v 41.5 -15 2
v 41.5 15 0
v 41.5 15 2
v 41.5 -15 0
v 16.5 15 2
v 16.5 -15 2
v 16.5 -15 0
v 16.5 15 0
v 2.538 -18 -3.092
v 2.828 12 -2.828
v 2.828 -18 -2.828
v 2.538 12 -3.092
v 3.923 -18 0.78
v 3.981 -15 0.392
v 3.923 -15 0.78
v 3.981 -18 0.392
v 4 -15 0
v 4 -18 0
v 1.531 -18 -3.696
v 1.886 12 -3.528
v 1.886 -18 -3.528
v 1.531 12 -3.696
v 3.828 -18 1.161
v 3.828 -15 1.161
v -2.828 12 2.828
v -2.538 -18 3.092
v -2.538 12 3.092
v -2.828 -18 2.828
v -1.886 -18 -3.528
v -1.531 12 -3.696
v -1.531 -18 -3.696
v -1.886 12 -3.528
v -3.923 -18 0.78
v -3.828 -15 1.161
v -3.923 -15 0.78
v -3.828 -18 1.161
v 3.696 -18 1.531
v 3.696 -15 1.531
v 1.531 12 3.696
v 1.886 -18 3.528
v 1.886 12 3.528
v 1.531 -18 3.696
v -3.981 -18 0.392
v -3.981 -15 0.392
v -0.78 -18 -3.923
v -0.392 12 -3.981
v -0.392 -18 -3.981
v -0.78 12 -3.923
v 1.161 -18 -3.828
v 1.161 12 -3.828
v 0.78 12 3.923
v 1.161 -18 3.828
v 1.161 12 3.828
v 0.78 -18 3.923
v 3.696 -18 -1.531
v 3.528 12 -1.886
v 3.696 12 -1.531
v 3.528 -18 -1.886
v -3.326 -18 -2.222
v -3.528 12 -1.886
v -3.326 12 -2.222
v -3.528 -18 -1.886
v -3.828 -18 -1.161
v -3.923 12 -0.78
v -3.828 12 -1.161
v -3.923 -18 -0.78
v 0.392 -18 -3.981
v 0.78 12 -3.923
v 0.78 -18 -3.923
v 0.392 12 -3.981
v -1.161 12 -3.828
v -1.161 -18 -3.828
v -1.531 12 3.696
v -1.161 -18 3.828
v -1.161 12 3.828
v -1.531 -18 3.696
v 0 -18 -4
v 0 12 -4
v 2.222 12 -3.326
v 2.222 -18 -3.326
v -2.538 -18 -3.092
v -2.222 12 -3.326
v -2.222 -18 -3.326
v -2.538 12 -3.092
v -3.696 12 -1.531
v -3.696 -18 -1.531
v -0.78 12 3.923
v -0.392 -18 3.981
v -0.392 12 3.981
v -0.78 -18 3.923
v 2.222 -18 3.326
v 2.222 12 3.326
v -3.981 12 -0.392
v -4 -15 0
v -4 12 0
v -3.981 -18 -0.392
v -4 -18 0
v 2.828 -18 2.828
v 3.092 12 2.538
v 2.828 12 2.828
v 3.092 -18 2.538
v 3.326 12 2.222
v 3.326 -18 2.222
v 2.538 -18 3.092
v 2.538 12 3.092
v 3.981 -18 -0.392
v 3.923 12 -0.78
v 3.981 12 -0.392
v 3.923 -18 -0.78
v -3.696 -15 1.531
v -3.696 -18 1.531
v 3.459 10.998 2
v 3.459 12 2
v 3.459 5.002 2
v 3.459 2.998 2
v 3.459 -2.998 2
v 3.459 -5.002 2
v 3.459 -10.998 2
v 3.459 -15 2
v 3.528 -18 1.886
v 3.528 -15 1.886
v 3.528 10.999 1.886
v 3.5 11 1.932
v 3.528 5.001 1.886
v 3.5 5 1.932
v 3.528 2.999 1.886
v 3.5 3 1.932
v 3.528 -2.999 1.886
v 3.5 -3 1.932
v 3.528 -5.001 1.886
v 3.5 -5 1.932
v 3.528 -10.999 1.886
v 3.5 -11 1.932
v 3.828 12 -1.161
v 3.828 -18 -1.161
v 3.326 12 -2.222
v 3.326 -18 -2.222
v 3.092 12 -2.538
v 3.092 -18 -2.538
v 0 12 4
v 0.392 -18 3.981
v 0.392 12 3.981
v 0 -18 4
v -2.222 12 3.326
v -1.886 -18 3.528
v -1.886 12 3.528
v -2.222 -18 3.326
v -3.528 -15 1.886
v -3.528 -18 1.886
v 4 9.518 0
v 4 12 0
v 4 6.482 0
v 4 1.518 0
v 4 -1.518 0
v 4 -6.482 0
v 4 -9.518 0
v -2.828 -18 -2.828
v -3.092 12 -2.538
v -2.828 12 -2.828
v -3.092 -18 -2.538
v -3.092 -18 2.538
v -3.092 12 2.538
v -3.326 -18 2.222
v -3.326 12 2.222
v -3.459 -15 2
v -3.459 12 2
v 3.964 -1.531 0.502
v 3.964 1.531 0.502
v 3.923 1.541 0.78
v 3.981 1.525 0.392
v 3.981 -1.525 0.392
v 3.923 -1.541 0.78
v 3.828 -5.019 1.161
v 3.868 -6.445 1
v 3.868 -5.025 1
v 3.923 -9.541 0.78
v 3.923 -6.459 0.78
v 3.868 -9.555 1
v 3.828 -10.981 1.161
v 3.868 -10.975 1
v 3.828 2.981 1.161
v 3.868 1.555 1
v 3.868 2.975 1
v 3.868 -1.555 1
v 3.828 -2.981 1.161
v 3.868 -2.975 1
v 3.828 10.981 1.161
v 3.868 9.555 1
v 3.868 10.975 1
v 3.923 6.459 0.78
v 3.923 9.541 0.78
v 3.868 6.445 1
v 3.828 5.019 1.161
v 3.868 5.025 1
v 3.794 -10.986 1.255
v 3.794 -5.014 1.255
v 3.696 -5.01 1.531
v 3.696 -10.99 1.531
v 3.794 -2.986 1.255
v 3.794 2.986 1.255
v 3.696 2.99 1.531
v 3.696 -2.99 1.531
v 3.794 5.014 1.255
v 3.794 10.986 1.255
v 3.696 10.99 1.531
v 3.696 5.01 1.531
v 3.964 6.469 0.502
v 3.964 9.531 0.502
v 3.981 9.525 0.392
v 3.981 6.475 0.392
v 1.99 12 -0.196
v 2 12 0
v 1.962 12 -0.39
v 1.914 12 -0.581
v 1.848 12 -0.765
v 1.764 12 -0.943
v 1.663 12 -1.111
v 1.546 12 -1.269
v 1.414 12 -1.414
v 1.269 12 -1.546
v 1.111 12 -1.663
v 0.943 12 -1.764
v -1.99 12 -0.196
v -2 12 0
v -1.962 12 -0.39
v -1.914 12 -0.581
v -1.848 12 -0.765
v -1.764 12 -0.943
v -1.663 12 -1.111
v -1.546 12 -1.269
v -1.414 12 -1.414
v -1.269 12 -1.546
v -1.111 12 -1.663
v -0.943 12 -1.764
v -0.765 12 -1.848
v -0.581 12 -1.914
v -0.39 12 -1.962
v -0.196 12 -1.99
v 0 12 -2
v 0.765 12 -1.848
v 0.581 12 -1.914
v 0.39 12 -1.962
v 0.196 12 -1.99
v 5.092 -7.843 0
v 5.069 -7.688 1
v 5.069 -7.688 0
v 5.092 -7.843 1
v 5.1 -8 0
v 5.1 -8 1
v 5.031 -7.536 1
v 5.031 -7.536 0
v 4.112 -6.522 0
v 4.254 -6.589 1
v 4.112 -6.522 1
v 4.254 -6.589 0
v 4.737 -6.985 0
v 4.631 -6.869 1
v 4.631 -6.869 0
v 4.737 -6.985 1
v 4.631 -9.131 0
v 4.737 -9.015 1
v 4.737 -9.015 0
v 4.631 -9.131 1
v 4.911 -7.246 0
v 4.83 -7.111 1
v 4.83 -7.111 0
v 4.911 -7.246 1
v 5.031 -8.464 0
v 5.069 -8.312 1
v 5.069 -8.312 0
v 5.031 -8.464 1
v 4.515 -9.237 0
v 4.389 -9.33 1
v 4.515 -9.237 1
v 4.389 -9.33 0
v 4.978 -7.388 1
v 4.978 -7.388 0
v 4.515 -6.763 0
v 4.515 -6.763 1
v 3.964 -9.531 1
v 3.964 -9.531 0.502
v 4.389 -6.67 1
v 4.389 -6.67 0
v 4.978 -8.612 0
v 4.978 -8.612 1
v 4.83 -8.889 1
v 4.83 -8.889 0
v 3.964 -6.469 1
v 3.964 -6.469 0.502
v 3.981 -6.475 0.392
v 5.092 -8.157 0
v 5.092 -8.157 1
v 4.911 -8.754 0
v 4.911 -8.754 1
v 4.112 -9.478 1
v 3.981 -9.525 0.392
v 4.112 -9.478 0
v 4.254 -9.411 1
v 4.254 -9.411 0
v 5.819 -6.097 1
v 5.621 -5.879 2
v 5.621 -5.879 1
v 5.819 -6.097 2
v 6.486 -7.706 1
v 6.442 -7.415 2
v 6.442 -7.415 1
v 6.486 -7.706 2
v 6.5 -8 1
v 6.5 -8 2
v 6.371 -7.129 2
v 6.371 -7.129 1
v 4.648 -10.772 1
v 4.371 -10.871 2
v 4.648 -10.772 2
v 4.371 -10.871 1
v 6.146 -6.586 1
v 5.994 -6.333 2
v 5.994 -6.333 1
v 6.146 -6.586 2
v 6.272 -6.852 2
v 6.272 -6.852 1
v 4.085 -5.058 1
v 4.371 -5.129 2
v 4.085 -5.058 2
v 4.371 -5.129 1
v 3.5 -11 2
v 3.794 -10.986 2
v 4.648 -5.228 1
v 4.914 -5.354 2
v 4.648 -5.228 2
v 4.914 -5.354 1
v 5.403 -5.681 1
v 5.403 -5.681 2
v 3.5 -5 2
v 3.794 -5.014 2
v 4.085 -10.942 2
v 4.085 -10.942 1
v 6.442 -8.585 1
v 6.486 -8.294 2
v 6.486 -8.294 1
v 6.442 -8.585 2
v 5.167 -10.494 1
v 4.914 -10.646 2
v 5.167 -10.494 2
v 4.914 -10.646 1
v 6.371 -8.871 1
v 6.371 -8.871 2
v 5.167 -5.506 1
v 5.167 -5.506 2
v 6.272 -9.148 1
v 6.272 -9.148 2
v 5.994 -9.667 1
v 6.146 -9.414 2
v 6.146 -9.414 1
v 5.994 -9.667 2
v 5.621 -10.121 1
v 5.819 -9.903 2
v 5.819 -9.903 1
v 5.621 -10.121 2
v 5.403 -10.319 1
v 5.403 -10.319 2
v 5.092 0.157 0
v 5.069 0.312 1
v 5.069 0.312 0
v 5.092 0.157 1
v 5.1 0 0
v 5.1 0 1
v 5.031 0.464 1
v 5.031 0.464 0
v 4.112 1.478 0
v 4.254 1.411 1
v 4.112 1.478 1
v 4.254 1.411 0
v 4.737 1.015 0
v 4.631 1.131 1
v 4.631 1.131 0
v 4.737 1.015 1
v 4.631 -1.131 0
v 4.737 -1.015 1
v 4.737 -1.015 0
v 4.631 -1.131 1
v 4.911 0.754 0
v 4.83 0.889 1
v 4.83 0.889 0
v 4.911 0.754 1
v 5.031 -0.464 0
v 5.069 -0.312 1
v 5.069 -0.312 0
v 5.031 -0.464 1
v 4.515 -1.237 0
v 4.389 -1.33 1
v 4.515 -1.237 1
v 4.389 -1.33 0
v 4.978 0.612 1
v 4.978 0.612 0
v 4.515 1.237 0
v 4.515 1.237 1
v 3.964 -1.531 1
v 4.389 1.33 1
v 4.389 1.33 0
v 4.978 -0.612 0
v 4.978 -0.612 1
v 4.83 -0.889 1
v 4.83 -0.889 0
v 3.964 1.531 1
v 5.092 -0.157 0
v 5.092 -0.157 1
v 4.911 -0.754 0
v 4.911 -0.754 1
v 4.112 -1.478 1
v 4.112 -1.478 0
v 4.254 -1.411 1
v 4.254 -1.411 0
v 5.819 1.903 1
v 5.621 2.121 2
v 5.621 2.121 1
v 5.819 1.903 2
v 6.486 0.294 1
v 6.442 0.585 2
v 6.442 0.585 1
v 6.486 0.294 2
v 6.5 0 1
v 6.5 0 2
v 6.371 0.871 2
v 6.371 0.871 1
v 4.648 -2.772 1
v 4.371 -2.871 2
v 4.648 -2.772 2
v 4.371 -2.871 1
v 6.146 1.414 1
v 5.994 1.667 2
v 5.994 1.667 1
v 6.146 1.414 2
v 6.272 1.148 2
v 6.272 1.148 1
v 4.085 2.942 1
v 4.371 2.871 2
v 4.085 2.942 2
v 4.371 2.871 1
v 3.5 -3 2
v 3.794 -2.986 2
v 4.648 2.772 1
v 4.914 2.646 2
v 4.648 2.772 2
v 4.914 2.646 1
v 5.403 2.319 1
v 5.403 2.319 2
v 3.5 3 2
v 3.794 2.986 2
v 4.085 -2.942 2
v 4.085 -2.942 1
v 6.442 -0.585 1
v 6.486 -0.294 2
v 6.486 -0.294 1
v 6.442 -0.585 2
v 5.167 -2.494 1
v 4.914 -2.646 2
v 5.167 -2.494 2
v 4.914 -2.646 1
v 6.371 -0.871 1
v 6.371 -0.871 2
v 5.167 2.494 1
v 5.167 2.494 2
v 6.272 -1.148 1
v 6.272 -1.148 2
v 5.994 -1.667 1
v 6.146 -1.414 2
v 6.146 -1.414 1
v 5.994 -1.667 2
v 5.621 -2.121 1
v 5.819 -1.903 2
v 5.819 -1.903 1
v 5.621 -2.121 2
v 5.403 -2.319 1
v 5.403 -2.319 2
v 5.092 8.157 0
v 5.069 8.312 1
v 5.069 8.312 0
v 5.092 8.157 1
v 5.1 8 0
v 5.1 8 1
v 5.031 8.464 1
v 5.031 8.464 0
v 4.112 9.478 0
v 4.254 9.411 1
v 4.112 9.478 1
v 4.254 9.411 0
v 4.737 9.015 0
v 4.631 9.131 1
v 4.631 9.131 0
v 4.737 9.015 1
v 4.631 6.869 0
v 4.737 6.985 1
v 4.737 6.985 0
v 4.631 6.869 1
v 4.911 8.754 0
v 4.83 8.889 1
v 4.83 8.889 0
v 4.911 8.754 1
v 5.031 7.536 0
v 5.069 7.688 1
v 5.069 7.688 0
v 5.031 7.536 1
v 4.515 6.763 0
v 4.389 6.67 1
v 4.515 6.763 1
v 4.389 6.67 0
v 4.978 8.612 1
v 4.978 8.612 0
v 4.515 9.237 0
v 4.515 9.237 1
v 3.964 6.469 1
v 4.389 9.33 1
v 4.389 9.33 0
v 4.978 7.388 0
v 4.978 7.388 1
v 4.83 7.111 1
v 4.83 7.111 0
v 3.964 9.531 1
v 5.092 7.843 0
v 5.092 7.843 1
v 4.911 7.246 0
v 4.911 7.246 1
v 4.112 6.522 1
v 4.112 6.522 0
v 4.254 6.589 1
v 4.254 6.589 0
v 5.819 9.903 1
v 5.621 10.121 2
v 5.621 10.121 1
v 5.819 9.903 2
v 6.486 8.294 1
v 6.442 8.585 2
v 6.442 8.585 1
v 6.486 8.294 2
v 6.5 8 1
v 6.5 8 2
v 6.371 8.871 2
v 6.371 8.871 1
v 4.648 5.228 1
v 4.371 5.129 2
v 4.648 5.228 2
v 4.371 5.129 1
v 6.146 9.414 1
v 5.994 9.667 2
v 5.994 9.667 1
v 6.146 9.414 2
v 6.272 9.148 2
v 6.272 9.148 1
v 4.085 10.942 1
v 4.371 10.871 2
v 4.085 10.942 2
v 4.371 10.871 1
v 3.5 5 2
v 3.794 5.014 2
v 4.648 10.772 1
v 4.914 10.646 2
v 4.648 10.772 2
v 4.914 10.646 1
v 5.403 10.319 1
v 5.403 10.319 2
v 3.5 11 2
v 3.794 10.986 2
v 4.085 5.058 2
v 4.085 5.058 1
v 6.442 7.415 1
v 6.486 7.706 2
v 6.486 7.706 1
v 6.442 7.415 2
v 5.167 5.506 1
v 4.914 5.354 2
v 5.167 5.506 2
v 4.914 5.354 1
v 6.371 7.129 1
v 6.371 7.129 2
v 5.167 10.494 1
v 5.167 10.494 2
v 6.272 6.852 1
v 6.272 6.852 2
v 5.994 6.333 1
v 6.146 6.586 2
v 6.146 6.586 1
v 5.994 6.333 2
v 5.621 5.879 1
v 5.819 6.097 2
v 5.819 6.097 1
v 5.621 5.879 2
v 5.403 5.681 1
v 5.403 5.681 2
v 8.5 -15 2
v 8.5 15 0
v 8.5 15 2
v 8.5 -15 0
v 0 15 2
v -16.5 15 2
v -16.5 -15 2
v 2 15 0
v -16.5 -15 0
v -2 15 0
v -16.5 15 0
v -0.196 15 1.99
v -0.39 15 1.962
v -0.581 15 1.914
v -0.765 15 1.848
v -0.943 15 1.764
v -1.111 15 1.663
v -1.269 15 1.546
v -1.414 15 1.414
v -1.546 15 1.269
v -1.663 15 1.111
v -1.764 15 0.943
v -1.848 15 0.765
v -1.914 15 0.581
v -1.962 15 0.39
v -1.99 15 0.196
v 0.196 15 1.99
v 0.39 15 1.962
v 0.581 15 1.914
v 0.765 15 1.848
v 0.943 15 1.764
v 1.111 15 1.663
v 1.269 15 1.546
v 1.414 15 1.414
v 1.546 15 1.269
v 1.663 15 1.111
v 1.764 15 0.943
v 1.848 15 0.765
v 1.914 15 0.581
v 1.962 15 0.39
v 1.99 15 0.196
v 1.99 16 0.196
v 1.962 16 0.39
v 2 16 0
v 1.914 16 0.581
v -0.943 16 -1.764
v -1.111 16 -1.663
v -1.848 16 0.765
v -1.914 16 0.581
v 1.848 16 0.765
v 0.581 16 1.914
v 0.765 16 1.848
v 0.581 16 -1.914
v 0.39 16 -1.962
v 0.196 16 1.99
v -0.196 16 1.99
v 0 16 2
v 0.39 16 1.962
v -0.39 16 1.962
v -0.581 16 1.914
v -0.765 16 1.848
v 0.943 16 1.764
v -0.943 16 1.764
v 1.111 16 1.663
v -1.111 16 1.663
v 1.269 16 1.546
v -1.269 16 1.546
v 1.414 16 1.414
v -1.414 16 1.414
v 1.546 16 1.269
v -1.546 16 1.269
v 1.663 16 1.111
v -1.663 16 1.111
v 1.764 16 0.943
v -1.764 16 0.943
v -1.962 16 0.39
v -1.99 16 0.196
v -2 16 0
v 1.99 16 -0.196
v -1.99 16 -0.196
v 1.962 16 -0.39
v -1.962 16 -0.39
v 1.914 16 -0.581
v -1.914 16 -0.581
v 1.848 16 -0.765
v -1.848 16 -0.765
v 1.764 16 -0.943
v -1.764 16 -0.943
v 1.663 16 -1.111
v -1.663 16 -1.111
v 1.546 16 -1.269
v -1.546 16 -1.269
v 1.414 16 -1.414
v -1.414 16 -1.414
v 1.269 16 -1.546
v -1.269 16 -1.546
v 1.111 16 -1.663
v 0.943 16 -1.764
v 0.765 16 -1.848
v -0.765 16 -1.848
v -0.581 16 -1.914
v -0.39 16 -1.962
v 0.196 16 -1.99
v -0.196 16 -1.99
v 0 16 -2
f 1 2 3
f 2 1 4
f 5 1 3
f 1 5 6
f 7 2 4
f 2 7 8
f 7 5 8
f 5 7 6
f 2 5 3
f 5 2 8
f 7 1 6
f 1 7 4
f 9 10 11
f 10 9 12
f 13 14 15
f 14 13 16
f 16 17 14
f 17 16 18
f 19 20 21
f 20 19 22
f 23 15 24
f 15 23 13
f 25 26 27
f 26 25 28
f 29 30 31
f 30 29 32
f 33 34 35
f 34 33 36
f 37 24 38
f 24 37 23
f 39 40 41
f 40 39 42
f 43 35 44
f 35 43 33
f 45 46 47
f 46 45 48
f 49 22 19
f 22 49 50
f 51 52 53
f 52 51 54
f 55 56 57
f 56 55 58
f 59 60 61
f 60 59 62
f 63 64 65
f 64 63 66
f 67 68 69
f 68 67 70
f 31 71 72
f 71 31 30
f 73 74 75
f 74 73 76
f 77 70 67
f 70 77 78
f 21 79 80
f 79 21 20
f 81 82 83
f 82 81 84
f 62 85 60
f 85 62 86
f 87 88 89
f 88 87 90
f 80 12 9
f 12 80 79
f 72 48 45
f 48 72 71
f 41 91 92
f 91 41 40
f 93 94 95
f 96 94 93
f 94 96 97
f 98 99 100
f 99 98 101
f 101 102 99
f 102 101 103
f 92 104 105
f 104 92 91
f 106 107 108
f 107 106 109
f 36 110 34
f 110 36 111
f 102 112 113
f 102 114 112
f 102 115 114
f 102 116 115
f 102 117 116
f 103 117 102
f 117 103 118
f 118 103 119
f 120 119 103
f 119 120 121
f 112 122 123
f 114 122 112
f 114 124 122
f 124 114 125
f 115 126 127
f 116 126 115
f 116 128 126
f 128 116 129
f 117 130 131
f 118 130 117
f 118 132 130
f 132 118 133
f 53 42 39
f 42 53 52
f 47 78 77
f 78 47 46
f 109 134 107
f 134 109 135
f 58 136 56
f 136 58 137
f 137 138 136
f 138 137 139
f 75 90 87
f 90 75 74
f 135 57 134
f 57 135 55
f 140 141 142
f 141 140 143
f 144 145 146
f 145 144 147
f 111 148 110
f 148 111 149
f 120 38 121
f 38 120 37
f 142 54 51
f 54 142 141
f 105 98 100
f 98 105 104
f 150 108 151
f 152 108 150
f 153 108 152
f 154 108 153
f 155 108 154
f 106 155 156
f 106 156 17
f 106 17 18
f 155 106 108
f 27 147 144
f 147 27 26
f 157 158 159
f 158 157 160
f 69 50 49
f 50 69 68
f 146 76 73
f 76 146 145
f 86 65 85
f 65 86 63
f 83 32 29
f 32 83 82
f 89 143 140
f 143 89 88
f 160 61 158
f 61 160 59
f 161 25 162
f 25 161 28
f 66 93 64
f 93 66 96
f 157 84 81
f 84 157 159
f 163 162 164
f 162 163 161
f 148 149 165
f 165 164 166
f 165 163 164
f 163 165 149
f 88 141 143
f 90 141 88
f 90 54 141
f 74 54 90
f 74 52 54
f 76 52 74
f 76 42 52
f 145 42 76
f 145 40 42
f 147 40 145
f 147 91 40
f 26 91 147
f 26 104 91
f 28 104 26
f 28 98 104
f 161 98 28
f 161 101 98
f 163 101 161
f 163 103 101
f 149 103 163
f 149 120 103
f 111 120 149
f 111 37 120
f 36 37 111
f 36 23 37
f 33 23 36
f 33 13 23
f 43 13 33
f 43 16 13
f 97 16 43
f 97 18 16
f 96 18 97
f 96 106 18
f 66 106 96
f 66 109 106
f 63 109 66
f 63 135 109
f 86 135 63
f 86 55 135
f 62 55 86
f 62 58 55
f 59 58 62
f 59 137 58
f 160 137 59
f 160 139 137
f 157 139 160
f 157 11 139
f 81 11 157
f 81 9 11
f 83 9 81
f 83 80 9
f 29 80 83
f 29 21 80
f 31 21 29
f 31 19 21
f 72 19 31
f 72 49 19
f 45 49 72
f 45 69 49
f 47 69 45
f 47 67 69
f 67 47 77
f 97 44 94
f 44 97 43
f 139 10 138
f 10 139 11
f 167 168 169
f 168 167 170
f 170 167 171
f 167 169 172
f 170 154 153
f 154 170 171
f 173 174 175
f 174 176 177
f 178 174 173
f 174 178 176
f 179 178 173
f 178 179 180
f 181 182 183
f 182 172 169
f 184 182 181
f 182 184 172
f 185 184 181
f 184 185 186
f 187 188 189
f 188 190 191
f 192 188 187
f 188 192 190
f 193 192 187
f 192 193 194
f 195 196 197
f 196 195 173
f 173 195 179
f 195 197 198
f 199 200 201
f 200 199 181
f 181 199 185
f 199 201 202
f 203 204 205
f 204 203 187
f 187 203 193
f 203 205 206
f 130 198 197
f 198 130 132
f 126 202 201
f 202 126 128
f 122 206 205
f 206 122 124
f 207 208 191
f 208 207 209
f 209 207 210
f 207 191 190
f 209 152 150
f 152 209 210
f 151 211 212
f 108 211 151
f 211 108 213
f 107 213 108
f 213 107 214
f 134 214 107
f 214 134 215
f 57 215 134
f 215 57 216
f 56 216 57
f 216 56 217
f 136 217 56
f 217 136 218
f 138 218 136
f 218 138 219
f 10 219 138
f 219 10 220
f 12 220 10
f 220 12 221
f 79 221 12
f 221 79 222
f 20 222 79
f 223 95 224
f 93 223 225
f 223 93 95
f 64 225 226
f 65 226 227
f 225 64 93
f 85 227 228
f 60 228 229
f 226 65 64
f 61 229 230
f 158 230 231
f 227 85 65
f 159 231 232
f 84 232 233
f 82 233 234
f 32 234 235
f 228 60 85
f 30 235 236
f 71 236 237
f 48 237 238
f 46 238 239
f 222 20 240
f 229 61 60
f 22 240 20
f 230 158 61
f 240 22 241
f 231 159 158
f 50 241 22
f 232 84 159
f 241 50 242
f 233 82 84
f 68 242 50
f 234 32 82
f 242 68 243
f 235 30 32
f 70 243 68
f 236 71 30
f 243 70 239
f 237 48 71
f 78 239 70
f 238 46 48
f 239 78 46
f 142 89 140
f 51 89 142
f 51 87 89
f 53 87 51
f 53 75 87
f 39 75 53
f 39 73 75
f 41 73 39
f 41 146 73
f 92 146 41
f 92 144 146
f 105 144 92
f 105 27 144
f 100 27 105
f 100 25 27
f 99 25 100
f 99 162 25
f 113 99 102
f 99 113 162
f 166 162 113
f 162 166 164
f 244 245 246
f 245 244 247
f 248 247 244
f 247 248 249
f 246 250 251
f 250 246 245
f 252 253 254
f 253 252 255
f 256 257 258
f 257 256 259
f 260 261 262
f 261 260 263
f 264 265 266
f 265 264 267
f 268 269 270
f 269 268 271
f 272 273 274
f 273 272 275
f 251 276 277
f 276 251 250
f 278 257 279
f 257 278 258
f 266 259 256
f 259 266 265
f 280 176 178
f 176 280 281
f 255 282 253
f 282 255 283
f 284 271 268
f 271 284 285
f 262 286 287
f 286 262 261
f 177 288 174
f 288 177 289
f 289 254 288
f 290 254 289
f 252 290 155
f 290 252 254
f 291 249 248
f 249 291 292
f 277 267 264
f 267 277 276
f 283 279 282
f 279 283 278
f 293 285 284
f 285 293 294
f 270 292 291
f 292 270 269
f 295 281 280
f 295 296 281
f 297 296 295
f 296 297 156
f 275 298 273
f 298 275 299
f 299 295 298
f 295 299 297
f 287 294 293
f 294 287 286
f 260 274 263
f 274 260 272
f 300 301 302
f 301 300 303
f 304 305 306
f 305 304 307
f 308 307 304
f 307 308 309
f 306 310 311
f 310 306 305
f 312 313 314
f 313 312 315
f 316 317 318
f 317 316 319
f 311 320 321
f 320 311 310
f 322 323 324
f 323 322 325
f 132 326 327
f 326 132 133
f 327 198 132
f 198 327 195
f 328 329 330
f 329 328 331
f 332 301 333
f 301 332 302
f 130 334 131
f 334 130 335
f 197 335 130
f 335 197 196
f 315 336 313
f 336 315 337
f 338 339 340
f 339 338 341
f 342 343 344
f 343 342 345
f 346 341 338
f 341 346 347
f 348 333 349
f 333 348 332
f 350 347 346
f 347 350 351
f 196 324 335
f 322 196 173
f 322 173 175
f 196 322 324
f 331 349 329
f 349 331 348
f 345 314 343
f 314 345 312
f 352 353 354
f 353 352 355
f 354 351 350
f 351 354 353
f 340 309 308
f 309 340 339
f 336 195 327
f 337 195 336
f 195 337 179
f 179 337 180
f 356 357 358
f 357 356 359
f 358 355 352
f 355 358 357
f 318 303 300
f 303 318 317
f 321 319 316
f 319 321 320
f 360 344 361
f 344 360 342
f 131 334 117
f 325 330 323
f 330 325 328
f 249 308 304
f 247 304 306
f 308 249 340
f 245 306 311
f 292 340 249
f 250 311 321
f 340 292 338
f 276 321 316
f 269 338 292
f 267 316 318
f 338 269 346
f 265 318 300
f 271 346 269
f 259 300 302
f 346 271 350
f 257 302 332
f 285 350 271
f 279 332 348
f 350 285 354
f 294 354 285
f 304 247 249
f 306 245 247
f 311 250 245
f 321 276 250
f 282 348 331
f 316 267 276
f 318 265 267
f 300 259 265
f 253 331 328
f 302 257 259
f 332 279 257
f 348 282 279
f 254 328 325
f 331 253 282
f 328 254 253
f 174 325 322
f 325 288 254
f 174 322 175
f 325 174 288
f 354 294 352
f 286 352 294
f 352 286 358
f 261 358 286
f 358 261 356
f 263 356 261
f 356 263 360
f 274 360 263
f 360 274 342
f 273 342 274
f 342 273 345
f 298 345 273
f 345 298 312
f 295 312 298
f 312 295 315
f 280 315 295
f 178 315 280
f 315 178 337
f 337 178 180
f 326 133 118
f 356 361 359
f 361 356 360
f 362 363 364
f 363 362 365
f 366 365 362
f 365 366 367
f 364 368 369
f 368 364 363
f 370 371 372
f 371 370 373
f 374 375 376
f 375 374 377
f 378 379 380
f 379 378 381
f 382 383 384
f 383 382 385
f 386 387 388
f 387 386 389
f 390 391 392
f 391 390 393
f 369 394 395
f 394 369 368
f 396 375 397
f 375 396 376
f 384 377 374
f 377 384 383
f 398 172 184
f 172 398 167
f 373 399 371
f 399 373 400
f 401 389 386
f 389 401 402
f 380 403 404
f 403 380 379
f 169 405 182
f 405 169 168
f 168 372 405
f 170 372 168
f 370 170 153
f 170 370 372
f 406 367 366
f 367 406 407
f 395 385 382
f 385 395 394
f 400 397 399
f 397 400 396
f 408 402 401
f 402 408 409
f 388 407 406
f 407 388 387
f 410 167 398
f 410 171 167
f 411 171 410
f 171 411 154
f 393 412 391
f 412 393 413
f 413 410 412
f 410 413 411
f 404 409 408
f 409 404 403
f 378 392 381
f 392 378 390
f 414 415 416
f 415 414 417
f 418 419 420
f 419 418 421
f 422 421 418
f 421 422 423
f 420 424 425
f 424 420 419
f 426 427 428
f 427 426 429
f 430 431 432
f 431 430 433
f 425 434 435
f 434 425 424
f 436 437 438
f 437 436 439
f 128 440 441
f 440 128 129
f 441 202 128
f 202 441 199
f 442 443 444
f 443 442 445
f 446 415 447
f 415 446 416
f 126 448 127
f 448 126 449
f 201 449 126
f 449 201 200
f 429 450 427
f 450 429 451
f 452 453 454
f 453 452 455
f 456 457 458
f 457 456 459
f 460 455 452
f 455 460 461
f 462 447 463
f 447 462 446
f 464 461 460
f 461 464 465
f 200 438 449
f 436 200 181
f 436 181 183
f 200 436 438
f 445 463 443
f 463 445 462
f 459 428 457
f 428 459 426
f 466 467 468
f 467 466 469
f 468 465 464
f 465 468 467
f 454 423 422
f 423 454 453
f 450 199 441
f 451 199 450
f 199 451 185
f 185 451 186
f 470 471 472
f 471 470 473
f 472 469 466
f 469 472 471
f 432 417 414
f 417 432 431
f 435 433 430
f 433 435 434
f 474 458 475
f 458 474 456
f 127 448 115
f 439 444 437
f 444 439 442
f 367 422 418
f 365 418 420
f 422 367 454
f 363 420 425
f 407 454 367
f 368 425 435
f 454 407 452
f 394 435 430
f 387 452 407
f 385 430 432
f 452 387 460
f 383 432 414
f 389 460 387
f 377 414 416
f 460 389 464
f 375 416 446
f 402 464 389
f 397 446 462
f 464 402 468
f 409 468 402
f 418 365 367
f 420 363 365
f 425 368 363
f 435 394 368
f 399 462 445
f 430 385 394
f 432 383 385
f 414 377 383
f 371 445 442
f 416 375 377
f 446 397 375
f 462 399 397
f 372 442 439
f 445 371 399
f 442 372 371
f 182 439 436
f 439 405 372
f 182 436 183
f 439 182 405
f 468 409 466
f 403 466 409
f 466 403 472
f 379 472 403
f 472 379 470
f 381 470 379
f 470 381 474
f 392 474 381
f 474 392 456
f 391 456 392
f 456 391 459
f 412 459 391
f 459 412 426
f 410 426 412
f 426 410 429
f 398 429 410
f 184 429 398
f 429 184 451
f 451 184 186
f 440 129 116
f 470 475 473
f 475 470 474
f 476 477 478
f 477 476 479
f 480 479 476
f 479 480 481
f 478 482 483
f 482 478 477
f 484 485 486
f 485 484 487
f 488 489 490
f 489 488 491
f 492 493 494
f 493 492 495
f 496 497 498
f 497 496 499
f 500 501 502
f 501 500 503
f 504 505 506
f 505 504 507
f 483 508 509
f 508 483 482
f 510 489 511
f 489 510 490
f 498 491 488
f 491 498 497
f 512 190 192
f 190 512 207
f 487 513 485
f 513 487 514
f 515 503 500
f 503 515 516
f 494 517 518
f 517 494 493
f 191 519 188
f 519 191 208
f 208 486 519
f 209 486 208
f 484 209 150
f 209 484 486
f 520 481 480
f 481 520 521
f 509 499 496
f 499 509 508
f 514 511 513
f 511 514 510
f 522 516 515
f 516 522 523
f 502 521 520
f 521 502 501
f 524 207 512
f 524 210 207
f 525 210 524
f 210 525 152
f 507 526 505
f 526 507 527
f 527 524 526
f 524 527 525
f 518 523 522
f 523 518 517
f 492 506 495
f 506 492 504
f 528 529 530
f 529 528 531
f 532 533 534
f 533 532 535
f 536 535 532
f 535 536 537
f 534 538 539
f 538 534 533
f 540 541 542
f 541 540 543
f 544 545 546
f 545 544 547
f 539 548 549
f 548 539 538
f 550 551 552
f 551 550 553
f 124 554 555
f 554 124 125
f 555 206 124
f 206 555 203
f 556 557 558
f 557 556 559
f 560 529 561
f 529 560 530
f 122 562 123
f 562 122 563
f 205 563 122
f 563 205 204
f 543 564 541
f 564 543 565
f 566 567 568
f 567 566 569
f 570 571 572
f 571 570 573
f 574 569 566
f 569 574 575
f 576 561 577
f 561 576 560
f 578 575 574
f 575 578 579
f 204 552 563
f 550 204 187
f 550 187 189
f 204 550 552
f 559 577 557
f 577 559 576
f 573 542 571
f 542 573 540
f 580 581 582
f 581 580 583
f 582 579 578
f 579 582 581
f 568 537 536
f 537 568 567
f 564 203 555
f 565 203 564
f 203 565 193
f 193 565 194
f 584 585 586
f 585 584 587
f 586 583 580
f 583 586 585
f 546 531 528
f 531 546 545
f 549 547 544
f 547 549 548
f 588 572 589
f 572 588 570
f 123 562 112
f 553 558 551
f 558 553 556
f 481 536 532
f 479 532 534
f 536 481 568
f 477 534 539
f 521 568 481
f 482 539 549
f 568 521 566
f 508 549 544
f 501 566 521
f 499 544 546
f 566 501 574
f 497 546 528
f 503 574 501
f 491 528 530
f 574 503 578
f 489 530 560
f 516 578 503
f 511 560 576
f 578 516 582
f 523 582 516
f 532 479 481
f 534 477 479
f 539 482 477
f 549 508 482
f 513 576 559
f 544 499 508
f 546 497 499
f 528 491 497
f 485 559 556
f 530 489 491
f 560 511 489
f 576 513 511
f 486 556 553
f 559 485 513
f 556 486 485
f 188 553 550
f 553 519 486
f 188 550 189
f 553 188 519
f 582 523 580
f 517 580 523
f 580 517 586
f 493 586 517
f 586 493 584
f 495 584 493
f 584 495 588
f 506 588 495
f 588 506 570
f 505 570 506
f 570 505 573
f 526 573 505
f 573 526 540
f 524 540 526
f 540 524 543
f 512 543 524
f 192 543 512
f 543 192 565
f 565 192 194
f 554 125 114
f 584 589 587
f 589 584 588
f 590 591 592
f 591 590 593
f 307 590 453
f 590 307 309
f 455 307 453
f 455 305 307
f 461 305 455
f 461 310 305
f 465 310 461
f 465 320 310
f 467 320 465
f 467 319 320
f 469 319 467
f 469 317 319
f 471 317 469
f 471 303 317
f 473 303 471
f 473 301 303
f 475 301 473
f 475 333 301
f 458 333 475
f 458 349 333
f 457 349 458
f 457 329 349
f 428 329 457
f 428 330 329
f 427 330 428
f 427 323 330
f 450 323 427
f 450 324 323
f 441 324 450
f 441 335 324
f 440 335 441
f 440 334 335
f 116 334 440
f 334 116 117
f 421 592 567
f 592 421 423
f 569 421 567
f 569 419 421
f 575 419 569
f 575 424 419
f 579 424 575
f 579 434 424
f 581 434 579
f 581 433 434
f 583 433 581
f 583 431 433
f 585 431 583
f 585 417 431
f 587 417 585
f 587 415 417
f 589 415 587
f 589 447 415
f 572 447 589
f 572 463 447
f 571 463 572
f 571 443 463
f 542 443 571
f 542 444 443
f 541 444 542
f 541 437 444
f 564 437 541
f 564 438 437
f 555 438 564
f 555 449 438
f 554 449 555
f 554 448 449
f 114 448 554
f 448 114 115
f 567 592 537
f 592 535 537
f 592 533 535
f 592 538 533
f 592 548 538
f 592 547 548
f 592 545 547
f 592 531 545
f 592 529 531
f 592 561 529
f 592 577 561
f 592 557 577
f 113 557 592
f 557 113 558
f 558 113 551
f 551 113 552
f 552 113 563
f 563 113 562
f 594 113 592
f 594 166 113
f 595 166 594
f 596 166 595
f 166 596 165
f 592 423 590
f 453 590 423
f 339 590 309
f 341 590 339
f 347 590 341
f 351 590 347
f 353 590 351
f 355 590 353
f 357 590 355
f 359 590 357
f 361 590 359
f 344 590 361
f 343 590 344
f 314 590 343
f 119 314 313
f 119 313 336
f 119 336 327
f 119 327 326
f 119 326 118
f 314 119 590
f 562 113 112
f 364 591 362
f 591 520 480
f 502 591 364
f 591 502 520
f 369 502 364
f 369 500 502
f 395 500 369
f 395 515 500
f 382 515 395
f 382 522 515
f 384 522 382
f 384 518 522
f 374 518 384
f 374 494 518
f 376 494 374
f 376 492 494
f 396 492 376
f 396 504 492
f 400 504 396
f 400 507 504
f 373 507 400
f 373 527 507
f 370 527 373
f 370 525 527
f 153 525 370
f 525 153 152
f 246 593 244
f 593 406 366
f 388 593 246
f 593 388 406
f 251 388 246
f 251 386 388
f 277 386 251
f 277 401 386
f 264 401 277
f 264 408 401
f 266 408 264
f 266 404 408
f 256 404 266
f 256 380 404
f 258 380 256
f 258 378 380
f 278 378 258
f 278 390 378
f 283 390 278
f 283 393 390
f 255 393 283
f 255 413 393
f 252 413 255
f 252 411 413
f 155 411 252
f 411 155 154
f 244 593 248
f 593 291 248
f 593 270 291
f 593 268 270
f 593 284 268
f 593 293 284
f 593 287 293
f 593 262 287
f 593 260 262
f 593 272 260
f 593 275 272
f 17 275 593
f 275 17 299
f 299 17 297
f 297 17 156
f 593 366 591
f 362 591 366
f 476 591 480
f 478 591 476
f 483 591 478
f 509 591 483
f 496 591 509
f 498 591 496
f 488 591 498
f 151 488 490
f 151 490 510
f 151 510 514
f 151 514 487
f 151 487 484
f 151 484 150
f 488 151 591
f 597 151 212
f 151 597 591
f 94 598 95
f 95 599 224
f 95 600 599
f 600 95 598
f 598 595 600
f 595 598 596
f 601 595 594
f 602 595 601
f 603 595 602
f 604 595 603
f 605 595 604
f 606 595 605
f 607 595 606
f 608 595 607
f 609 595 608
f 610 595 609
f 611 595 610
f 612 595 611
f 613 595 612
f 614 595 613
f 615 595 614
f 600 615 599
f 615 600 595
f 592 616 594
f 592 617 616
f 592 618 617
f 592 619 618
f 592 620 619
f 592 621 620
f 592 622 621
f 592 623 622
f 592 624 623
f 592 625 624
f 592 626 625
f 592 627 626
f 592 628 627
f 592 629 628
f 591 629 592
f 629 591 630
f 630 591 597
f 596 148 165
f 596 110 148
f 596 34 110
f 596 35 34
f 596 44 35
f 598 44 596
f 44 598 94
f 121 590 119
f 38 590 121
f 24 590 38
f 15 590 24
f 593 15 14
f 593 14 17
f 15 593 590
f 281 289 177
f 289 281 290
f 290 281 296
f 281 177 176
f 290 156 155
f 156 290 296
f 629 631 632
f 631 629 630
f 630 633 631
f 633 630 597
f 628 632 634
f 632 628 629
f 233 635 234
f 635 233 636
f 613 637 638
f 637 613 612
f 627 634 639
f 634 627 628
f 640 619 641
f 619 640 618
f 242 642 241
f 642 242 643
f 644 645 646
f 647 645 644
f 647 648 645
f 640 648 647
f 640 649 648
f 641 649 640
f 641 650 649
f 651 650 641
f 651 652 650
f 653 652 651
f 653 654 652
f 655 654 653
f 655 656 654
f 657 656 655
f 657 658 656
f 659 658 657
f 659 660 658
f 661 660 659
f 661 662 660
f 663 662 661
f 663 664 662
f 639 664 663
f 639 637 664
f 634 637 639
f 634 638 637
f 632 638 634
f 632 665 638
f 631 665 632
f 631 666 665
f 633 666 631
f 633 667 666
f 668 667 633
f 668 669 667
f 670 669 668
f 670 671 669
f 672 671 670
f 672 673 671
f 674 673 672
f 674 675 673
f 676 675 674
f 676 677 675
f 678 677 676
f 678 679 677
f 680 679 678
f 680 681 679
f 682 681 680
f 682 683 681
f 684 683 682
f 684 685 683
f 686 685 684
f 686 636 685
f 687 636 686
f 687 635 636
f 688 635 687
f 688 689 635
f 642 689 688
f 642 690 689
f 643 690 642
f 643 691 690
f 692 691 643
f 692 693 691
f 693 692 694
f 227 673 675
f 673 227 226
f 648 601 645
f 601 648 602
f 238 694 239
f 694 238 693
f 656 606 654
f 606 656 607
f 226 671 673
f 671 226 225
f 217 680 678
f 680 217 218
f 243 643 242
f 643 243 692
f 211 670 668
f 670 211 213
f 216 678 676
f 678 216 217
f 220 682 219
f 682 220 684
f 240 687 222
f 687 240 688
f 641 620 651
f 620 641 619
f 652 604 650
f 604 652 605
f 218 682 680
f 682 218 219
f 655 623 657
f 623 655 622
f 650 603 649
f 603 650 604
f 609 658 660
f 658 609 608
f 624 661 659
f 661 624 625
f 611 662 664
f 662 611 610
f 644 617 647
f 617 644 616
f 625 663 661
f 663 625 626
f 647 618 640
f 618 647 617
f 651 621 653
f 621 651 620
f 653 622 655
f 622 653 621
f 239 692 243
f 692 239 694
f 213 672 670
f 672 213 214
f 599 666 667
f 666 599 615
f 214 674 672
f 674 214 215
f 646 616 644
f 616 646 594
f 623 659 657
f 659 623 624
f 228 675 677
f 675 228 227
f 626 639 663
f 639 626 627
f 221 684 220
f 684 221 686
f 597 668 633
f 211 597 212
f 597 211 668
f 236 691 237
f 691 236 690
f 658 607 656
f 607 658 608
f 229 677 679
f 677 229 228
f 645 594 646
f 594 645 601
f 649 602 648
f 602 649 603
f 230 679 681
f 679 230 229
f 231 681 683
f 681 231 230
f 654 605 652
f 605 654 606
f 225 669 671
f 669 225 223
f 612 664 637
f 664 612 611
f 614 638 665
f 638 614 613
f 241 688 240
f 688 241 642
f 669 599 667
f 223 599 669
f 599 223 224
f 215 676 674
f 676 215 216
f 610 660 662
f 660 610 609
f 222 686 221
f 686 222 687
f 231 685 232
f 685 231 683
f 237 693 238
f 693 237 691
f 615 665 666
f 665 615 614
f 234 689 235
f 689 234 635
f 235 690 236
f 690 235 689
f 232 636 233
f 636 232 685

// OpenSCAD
// Butt hinge (opened 180°)  ---------------------------
// Parameters
leaf_w   = 25;     // width (X direction)
leaf_h   = 30;     // height (Y direction)
leaf_t   = 2;      // thickness (Z)
kn_d_out = 8;      // knuckle outer diameter
kn_d_in  = 4.6;    // knuckle inner diameter  (= pin Ø + 0.3)
kn_len   = 6;      // each knuckle length
pin_d    = 4;      // pin diameter
pin_len  = 32;     // pin total length (30 + 1 + 1)
hole_d   = 3.2;    // through-hole diameter
cs_d     = 6;      // countersink top diameter
cs_depth = 1;      // countersink depth
hole_off = 20;     // X position of holes from origin (±)
hole_pitch = 8;    // Y spacing between holes

$fn = 64;

// Main assembly
module hinge()
{
    // pin
    rotate([90,0,0])
        translate([0,0,-pin_len/2])
            cylinder(d=pin_d, h=pin_len);

    // leaves
    leaf(side = -1);   // left leaf (x < 0)
    leaf(side =  1);   // right leaf (x > 0)
}

// Leaf with knuckles and holes
// side = -1 (left), +1 (right)
module leaf(side = -1)
{
    // Base plate
    translate([side*(leaf_w * -0.5 - kn_d_out/2), -leaf_h/2, 0])
        difference()
        {
            // plate
            cube([leaf_w, leaf_h, leaf_t]);

            // countersunk holes
            for(i=[-1,0,1])          // three holes
            {
                y_pos = leaf_h/2 + i*hole_pitch;   // convert i index to Y
                translate([side*hole_off, y_pos, 0])
                    countersunk_hole();
            }
        }

    // Knuckles
    for(idx=[0:4])
    {
        // decide if this knuckle belongs to this leaf
        knuckle_to_side = (idx % 2 == 0) ? -1 : 1;   // even -> left, odd -> right
        if(knuckle_to_side == side)
        {
            y_center = -leaf_h/2 + kn_len/2 + idx*kn_len;
            // Solid cylinder knuckle (outer)
            translate([0, y_center, 0])
                rotate([90,0,0])
                    cylinder(d=kn_d_out, h=kn_len);

            // Bore for pin clearance
            translate([0, y_center, 0])
                rotate([90,0,0])
                    #cylinder(d=kn_d_in, h=kn_len);   // use "#" for preview of hole
        }
    }
}

// Countersunk hole (subtractive)
module countersunk_hole()
{
    union()
    {
        // through hole
        translate([0,0,-1])   // extend a bit below plate for clean subtraction
            cylinder(d=hole_d, h=leaf_t+2);

        // countersink (straight-walled approximation)
        translate([0,0,leaf_t-cs_depth])
            cylinder(d=cs_d, h=cs_depth+0.01); // slight overlap
    }
}

// --- Render ---
hinge();
